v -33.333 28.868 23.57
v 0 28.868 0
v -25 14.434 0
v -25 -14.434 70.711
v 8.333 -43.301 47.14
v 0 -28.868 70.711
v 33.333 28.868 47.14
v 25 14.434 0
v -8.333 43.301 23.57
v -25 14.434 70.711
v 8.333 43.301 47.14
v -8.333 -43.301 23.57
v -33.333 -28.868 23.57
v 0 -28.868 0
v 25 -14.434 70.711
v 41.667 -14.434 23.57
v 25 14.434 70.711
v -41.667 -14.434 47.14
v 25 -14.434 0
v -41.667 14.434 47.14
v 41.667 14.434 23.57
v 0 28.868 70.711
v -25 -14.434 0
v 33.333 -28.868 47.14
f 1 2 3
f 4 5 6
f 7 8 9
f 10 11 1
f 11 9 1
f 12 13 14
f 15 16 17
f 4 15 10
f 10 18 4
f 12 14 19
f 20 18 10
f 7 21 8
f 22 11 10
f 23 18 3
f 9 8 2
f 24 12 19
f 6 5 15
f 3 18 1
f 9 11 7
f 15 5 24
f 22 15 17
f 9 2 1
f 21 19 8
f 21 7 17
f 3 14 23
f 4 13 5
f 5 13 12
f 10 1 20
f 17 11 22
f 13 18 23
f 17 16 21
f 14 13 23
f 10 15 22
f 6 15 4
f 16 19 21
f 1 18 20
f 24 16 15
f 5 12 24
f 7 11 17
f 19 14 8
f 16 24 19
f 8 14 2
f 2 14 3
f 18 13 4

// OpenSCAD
r = 50;

x0 = r * cos(0);
y0 = r * sin(0);

x1 = r * cos(120);
y1 = r * sin(120);

x2 = r * cos(-120);
y2 = r * sin(-120);

xa0 = r * cos(60);
ya0 = r * sin(60);

xa1 = r * cos(180);
ya1 = r * sin(180);

xa2 = r * cos(-60);
ya2 = r * sin(-60);

Lsq = (x1 - x2) * (x1 - x2) + (y1 - y2) * (y1 - y2);
sqsq = (x1 - xa1) * (x1 - xa1) + (y1 - ya1) * (y1 - ya1);
// Lsq = h * h + (x1 - xa1) * (x1 - xa1) + (y1 - ya1) * (y1 - ya1)
h = sqrt(Lsq - sqsq);

epsilon = 0.000002;

module th(a, b) translate(2/3 * a + b / 3)
    cube([epsilon, epsilon, epsilon], center=true);

octo_points = [
    [x0, y0, 0],
    [x1, y1, 0],
    [x2, y2, 0],
    [xa0, ya0, h],
    [xa1, ya1, h],
    [xa2, ya2, h]];

hull() {
    for (i = [0: 5])
        for (j = [0: 5])
            if (i != j)
                th(octo_points[i], octo_points[j]);
}
